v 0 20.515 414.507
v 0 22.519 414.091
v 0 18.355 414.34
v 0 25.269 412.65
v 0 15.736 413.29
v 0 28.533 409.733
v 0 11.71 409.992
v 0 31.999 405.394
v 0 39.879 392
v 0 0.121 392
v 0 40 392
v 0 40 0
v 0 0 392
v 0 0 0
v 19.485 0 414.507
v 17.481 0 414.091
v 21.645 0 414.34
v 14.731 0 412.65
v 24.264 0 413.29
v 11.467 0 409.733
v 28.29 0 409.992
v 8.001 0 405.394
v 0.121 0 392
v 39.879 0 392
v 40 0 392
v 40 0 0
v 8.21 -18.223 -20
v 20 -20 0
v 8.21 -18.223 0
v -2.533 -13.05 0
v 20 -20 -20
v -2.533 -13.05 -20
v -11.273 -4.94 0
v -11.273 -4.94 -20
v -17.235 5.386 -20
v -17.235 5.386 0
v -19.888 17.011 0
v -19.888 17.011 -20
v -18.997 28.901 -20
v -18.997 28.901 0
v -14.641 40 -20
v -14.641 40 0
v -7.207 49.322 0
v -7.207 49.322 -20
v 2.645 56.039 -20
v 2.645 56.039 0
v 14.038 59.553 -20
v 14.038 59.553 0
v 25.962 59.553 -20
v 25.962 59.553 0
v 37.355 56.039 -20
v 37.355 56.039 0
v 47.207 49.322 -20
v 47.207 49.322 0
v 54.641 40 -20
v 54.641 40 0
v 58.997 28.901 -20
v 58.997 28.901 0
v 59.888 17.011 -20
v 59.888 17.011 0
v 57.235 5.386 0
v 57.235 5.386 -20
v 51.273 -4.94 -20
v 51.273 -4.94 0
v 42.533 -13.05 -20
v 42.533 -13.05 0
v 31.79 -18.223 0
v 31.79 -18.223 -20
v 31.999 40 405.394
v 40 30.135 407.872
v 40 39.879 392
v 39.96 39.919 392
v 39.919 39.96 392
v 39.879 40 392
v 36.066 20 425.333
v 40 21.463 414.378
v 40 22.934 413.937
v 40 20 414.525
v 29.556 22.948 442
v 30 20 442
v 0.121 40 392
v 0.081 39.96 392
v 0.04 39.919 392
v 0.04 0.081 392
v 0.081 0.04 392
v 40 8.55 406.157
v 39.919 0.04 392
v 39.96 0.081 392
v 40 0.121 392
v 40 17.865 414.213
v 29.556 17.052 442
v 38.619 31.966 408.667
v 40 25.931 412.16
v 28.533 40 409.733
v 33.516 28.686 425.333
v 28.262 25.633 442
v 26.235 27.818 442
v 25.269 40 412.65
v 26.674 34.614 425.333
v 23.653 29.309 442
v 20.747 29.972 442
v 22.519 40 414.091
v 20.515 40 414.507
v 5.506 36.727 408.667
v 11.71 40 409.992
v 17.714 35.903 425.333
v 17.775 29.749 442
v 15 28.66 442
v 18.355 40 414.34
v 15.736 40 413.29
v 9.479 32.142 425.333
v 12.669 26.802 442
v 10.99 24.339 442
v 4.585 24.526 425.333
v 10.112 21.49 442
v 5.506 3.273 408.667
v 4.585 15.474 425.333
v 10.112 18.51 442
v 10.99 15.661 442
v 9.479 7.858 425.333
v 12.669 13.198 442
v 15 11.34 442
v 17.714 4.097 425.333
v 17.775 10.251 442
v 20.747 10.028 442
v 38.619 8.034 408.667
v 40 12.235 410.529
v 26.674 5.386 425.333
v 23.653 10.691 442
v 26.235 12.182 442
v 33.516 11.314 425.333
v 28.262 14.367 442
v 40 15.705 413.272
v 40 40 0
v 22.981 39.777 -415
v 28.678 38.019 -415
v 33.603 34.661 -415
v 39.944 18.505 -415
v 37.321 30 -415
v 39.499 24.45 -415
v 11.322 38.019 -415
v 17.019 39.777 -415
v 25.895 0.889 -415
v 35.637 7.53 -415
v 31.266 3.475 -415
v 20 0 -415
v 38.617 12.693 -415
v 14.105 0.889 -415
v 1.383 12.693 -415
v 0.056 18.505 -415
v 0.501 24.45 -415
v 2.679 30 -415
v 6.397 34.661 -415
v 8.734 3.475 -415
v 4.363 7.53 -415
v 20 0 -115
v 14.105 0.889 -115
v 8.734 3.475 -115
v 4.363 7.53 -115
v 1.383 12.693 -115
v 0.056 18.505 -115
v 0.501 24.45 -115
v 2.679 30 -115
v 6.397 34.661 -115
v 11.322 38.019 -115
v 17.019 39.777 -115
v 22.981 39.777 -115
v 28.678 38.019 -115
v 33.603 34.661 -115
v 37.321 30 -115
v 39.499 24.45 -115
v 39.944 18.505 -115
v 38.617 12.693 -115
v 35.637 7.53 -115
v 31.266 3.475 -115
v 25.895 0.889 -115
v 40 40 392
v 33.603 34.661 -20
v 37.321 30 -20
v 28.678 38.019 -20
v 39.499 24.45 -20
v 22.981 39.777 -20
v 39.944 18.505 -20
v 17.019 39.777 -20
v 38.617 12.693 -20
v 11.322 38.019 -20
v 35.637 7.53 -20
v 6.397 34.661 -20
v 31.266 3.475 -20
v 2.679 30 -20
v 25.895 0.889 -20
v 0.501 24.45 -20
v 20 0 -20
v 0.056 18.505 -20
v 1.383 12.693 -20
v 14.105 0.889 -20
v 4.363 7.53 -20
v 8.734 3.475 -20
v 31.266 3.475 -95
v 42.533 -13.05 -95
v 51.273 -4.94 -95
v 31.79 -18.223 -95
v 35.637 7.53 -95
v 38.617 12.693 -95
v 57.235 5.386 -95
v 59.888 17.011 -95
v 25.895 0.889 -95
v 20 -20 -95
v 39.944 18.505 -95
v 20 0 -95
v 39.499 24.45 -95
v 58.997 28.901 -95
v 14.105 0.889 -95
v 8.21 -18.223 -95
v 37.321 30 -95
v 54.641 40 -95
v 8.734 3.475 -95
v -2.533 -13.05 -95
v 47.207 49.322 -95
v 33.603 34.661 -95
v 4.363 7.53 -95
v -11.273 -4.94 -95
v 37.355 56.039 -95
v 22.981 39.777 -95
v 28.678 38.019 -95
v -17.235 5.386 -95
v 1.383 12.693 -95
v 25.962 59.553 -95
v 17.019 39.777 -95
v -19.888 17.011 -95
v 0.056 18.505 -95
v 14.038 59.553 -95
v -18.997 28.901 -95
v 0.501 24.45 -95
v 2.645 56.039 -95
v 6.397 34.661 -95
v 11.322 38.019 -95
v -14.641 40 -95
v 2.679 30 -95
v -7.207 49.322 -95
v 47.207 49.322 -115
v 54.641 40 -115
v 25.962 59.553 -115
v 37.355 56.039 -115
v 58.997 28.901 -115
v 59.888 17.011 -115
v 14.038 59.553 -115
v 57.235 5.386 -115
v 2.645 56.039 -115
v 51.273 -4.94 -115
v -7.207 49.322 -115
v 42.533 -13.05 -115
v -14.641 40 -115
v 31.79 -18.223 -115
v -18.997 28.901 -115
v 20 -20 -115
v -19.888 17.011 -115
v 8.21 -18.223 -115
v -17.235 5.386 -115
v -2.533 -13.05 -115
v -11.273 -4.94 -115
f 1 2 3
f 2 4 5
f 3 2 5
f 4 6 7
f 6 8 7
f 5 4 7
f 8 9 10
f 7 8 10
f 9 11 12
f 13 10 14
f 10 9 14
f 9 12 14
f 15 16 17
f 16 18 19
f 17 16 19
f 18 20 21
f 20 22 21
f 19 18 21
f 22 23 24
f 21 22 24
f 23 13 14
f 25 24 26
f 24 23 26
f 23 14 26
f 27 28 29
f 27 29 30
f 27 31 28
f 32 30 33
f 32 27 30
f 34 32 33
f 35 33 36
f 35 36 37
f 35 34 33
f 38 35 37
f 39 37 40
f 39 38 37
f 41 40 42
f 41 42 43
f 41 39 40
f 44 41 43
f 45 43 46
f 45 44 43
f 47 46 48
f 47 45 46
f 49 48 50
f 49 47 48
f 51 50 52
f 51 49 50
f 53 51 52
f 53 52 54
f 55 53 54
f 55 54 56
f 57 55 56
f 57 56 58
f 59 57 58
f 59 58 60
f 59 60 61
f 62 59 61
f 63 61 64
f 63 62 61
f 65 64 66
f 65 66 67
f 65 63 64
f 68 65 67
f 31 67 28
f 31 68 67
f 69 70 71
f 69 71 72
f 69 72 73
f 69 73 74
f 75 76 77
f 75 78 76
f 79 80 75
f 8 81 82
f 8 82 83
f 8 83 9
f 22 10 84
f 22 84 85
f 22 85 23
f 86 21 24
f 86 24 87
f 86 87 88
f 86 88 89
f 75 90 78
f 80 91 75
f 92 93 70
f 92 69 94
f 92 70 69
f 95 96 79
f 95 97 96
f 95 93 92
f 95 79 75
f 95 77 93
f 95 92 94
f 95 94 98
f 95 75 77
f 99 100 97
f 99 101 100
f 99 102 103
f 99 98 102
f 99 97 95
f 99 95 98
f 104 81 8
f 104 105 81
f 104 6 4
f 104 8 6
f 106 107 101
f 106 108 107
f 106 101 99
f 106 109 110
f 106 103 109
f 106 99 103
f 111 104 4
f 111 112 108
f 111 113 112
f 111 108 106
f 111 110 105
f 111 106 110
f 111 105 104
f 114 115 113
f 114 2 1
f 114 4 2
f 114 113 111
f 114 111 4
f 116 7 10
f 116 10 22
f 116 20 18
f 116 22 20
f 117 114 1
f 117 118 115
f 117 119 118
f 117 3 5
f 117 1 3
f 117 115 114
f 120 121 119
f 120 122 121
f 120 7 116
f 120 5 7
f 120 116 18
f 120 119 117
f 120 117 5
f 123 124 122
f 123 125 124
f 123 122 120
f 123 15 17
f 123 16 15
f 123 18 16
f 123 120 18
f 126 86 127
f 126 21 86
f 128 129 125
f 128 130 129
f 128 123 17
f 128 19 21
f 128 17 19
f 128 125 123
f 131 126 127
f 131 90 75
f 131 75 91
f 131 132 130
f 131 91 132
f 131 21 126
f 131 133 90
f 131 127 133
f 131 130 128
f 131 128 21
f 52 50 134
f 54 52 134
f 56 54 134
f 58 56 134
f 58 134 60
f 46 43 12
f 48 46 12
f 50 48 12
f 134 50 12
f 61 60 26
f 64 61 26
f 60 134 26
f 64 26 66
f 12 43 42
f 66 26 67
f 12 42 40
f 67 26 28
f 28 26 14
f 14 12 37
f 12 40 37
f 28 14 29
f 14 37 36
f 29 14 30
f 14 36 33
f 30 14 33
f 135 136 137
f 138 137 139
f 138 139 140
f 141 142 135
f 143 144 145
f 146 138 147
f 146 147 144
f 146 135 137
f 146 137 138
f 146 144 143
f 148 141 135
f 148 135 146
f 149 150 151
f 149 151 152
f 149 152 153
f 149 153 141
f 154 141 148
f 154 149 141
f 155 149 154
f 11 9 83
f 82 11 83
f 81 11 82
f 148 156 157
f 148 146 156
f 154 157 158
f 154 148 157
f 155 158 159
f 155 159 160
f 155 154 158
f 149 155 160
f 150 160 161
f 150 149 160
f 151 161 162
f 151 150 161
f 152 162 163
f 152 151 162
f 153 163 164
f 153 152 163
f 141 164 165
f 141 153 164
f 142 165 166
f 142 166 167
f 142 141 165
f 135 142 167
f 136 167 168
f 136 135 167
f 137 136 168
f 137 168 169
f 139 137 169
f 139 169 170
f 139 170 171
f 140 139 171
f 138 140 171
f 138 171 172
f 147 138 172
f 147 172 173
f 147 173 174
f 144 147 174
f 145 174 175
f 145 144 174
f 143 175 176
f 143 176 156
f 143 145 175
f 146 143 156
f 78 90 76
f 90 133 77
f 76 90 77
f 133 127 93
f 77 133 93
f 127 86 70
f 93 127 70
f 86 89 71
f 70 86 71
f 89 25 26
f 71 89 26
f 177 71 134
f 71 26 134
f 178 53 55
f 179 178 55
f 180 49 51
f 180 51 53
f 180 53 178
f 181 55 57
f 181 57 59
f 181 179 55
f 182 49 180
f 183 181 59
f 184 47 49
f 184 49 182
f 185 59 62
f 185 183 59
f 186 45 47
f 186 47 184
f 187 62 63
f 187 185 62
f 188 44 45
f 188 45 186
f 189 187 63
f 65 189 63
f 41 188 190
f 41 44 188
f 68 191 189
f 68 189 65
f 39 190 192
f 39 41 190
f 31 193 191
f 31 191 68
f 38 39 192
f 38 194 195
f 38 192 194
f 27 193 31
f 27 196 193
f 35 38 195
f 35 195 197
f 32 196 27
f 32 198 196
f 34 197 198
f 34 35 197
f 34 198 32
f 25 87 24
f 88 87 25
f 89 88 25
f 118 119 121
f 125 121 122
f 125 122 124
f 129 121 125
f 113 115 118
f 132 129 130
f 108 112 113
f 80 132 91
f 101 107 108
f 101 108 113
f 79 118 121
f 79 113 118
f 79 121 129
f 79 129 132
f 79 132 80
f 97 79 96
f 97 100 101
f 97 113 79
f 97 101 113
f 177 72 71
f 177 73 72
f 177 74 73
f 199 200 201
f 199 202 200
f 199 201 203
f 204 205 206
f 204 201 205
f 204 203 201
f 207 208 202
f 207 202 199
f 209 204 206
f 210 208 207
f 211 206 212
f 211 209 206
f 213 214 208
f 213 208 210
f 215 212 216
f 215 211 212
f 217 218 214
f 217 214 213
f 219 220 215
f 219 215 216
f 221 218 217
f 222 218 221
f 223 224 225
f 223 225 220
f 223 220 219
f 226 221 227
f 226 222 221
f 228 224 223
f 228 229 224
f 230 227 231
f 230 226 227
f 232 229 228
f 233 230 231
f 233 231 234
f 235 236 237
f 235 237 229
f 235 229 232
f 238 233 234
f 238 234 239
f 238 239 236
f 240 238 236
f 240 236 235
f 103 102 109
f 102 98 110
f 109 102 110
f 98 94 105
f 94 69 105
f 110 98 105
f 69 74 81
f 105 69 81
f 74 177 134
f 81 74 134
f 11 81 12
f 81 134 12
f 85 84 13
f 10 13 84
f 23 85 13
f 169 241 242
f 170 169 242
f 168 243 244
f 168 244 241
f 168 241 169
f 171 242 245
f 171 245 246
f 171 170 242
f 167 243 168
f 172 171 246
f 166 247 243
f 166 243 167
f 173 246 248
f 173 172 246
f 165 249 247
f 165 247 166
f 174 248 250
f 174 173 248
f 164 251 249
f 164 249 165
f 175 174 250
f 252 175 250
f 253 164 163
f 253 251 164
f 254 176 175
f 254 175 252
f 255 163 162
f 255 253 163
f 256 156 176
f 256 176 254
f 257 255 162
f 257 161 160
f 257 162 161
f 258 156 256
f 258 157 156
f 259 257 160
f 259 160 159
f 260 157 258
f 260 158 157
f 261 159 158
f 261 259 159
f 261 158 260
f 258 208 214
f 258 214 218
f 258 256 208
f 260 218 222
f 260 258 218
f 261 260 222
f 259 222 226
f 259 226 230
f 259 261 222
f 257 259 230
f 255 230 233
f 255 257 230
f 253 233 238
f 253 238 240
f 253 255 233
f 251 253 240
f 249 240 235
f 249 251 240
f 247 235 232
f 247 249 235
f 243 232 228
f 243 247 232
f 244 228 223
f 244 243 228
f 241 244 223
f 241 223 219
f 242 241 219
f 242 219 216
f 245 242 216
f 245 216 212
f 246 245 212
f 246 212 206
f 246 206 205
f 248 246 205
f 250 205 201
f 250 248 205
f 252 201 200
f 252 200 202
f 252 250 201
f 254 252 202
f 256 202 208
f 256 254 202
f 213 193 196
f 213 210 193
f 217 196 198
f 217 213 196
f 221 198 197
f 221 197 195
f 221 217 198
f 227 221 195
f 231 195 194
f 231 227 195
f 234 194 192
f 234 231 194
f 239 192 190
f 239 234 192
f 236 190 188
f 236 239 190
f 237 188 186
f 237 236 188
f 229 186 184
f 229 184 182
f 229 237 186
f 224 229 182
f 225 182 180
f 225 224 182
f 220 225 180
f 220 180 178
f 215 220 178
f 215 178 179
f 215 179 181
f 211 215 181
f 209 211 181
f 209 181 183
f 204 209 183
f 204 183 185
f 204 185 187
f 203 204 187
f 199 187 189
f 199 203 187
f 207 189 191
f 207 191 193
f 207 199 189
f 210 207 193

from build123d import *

# Parameters (mm, degrees)
ESQUISSE1_W             = 40
ESQUISSE1_H             = 40
BOSS_EXTRU_1_DEPTH      = 392
BOSS_EXTRU_2_START      = 50
ESQUISSE2_R             = 10
BOSS_EXTRU_2_DEPTH      = 50
BOSS_EXTRU_2_DRAFT      = 20
ENL_V_MAT_EXTRU_1_DEPTH = 398.882134636


with BuildPart() as part:
    # Esquisse1 → Boss.-Extru.1 (new body)
    with BuildSketch(Plane.XY):
        with Locations((20, 20)):
            Rectangle(ESQUISSE1_W, ESQUISSE1_H)
    extrude(amount=BOSS_EXTRU_1_DEPTH)


with BuildPart() as boss_extru_2_tool:
    # Esquisse2 → Boss.-Extru.2 (with draft: the straight prism first)
    with BuildSketch(Plane.XY.offset(392).offset(BOSS_EXTRU_2_START)):
        with Locations((20, 20)):
            Circle(ESQUISSE2_R)
    extrude(amount=-BOSS_EXTRU_2_DEPTH)
    # Boss.-Extru.2: the draft: its side faces are tilted about the plane it starts from
    boss_extru_2_sides = [boss_extru_2_tool.faces().sort_by_distance(p)[0] for p in [
        (10, 20, 417),
    ]]
    draft(boss_extru_2_sides, Plane.XY.offset(392).offset(BOSS_EXTRU_2_START), BOSS_EXTRU_2_DRAFT)


with BuildPart() as part_1:
    add(part.part)

    # Boss.-Extru.2: add boss_extru_2_tool
    add(boss_extru_2_tool.part)

    # Esquisse3 → Enlèv. mat.-Extru.1 (cut, through all)
    with BuildSketch(Plane(origin=(0, 0, 392), x_dir=(-1, 0, 0), z_dir=(0, 0, -1))):
        with BuildLine():
            ThreePointArc((-0.121467286, 40), (-20, 48.198511713), (-39.878532714, 40))
            Line((-39.878532714, 40), (-0.121467286, 40))
        make_face()
        with BuildLine():
            Line((-40, 0.121467286), (-40, 39.878532714))
            ThreePointArc((-40, 39.878532714), (-48.198511713, 20), (-40, 0.121467286))
        make_face()
        with BuildLine():
            ThreePointArc((0, 0.121467286), (8.198511713, 20), (0, 39.878532714))
            Line((0, 39.878532714), (0, 0.121467286))
        make_face()
        with BuildLine():
            Line((-0.121467286, 0), (-39.878532714, 0))
            ThreePointArc((-39.878532714, 0), (-20, -8.198511713), (-0.121467286, 0))
        make_face()
    extrude(amount=-ENL_V_MAT_EXTRU_1_DEPTH, mode=Mode.SUBTRACT)

    # Esquisse5 → Révolution1 (revolve)
    with BuildSketch(Plane(origin=(20, 0, 0), x_dir=(0, 0, -1), z_dir=(1, 0, 0))):
        Polygon((0, 40), (0, 60), (20, 60), (20, 40), (95, 40), (95, 60), (115, 60), (115, 40), (415, 40), (415, 20), (0, 20), align=None)
    revolve(axis=Axis((20, 20, 0), (0, 0, -1)))


solid = part_1.part
